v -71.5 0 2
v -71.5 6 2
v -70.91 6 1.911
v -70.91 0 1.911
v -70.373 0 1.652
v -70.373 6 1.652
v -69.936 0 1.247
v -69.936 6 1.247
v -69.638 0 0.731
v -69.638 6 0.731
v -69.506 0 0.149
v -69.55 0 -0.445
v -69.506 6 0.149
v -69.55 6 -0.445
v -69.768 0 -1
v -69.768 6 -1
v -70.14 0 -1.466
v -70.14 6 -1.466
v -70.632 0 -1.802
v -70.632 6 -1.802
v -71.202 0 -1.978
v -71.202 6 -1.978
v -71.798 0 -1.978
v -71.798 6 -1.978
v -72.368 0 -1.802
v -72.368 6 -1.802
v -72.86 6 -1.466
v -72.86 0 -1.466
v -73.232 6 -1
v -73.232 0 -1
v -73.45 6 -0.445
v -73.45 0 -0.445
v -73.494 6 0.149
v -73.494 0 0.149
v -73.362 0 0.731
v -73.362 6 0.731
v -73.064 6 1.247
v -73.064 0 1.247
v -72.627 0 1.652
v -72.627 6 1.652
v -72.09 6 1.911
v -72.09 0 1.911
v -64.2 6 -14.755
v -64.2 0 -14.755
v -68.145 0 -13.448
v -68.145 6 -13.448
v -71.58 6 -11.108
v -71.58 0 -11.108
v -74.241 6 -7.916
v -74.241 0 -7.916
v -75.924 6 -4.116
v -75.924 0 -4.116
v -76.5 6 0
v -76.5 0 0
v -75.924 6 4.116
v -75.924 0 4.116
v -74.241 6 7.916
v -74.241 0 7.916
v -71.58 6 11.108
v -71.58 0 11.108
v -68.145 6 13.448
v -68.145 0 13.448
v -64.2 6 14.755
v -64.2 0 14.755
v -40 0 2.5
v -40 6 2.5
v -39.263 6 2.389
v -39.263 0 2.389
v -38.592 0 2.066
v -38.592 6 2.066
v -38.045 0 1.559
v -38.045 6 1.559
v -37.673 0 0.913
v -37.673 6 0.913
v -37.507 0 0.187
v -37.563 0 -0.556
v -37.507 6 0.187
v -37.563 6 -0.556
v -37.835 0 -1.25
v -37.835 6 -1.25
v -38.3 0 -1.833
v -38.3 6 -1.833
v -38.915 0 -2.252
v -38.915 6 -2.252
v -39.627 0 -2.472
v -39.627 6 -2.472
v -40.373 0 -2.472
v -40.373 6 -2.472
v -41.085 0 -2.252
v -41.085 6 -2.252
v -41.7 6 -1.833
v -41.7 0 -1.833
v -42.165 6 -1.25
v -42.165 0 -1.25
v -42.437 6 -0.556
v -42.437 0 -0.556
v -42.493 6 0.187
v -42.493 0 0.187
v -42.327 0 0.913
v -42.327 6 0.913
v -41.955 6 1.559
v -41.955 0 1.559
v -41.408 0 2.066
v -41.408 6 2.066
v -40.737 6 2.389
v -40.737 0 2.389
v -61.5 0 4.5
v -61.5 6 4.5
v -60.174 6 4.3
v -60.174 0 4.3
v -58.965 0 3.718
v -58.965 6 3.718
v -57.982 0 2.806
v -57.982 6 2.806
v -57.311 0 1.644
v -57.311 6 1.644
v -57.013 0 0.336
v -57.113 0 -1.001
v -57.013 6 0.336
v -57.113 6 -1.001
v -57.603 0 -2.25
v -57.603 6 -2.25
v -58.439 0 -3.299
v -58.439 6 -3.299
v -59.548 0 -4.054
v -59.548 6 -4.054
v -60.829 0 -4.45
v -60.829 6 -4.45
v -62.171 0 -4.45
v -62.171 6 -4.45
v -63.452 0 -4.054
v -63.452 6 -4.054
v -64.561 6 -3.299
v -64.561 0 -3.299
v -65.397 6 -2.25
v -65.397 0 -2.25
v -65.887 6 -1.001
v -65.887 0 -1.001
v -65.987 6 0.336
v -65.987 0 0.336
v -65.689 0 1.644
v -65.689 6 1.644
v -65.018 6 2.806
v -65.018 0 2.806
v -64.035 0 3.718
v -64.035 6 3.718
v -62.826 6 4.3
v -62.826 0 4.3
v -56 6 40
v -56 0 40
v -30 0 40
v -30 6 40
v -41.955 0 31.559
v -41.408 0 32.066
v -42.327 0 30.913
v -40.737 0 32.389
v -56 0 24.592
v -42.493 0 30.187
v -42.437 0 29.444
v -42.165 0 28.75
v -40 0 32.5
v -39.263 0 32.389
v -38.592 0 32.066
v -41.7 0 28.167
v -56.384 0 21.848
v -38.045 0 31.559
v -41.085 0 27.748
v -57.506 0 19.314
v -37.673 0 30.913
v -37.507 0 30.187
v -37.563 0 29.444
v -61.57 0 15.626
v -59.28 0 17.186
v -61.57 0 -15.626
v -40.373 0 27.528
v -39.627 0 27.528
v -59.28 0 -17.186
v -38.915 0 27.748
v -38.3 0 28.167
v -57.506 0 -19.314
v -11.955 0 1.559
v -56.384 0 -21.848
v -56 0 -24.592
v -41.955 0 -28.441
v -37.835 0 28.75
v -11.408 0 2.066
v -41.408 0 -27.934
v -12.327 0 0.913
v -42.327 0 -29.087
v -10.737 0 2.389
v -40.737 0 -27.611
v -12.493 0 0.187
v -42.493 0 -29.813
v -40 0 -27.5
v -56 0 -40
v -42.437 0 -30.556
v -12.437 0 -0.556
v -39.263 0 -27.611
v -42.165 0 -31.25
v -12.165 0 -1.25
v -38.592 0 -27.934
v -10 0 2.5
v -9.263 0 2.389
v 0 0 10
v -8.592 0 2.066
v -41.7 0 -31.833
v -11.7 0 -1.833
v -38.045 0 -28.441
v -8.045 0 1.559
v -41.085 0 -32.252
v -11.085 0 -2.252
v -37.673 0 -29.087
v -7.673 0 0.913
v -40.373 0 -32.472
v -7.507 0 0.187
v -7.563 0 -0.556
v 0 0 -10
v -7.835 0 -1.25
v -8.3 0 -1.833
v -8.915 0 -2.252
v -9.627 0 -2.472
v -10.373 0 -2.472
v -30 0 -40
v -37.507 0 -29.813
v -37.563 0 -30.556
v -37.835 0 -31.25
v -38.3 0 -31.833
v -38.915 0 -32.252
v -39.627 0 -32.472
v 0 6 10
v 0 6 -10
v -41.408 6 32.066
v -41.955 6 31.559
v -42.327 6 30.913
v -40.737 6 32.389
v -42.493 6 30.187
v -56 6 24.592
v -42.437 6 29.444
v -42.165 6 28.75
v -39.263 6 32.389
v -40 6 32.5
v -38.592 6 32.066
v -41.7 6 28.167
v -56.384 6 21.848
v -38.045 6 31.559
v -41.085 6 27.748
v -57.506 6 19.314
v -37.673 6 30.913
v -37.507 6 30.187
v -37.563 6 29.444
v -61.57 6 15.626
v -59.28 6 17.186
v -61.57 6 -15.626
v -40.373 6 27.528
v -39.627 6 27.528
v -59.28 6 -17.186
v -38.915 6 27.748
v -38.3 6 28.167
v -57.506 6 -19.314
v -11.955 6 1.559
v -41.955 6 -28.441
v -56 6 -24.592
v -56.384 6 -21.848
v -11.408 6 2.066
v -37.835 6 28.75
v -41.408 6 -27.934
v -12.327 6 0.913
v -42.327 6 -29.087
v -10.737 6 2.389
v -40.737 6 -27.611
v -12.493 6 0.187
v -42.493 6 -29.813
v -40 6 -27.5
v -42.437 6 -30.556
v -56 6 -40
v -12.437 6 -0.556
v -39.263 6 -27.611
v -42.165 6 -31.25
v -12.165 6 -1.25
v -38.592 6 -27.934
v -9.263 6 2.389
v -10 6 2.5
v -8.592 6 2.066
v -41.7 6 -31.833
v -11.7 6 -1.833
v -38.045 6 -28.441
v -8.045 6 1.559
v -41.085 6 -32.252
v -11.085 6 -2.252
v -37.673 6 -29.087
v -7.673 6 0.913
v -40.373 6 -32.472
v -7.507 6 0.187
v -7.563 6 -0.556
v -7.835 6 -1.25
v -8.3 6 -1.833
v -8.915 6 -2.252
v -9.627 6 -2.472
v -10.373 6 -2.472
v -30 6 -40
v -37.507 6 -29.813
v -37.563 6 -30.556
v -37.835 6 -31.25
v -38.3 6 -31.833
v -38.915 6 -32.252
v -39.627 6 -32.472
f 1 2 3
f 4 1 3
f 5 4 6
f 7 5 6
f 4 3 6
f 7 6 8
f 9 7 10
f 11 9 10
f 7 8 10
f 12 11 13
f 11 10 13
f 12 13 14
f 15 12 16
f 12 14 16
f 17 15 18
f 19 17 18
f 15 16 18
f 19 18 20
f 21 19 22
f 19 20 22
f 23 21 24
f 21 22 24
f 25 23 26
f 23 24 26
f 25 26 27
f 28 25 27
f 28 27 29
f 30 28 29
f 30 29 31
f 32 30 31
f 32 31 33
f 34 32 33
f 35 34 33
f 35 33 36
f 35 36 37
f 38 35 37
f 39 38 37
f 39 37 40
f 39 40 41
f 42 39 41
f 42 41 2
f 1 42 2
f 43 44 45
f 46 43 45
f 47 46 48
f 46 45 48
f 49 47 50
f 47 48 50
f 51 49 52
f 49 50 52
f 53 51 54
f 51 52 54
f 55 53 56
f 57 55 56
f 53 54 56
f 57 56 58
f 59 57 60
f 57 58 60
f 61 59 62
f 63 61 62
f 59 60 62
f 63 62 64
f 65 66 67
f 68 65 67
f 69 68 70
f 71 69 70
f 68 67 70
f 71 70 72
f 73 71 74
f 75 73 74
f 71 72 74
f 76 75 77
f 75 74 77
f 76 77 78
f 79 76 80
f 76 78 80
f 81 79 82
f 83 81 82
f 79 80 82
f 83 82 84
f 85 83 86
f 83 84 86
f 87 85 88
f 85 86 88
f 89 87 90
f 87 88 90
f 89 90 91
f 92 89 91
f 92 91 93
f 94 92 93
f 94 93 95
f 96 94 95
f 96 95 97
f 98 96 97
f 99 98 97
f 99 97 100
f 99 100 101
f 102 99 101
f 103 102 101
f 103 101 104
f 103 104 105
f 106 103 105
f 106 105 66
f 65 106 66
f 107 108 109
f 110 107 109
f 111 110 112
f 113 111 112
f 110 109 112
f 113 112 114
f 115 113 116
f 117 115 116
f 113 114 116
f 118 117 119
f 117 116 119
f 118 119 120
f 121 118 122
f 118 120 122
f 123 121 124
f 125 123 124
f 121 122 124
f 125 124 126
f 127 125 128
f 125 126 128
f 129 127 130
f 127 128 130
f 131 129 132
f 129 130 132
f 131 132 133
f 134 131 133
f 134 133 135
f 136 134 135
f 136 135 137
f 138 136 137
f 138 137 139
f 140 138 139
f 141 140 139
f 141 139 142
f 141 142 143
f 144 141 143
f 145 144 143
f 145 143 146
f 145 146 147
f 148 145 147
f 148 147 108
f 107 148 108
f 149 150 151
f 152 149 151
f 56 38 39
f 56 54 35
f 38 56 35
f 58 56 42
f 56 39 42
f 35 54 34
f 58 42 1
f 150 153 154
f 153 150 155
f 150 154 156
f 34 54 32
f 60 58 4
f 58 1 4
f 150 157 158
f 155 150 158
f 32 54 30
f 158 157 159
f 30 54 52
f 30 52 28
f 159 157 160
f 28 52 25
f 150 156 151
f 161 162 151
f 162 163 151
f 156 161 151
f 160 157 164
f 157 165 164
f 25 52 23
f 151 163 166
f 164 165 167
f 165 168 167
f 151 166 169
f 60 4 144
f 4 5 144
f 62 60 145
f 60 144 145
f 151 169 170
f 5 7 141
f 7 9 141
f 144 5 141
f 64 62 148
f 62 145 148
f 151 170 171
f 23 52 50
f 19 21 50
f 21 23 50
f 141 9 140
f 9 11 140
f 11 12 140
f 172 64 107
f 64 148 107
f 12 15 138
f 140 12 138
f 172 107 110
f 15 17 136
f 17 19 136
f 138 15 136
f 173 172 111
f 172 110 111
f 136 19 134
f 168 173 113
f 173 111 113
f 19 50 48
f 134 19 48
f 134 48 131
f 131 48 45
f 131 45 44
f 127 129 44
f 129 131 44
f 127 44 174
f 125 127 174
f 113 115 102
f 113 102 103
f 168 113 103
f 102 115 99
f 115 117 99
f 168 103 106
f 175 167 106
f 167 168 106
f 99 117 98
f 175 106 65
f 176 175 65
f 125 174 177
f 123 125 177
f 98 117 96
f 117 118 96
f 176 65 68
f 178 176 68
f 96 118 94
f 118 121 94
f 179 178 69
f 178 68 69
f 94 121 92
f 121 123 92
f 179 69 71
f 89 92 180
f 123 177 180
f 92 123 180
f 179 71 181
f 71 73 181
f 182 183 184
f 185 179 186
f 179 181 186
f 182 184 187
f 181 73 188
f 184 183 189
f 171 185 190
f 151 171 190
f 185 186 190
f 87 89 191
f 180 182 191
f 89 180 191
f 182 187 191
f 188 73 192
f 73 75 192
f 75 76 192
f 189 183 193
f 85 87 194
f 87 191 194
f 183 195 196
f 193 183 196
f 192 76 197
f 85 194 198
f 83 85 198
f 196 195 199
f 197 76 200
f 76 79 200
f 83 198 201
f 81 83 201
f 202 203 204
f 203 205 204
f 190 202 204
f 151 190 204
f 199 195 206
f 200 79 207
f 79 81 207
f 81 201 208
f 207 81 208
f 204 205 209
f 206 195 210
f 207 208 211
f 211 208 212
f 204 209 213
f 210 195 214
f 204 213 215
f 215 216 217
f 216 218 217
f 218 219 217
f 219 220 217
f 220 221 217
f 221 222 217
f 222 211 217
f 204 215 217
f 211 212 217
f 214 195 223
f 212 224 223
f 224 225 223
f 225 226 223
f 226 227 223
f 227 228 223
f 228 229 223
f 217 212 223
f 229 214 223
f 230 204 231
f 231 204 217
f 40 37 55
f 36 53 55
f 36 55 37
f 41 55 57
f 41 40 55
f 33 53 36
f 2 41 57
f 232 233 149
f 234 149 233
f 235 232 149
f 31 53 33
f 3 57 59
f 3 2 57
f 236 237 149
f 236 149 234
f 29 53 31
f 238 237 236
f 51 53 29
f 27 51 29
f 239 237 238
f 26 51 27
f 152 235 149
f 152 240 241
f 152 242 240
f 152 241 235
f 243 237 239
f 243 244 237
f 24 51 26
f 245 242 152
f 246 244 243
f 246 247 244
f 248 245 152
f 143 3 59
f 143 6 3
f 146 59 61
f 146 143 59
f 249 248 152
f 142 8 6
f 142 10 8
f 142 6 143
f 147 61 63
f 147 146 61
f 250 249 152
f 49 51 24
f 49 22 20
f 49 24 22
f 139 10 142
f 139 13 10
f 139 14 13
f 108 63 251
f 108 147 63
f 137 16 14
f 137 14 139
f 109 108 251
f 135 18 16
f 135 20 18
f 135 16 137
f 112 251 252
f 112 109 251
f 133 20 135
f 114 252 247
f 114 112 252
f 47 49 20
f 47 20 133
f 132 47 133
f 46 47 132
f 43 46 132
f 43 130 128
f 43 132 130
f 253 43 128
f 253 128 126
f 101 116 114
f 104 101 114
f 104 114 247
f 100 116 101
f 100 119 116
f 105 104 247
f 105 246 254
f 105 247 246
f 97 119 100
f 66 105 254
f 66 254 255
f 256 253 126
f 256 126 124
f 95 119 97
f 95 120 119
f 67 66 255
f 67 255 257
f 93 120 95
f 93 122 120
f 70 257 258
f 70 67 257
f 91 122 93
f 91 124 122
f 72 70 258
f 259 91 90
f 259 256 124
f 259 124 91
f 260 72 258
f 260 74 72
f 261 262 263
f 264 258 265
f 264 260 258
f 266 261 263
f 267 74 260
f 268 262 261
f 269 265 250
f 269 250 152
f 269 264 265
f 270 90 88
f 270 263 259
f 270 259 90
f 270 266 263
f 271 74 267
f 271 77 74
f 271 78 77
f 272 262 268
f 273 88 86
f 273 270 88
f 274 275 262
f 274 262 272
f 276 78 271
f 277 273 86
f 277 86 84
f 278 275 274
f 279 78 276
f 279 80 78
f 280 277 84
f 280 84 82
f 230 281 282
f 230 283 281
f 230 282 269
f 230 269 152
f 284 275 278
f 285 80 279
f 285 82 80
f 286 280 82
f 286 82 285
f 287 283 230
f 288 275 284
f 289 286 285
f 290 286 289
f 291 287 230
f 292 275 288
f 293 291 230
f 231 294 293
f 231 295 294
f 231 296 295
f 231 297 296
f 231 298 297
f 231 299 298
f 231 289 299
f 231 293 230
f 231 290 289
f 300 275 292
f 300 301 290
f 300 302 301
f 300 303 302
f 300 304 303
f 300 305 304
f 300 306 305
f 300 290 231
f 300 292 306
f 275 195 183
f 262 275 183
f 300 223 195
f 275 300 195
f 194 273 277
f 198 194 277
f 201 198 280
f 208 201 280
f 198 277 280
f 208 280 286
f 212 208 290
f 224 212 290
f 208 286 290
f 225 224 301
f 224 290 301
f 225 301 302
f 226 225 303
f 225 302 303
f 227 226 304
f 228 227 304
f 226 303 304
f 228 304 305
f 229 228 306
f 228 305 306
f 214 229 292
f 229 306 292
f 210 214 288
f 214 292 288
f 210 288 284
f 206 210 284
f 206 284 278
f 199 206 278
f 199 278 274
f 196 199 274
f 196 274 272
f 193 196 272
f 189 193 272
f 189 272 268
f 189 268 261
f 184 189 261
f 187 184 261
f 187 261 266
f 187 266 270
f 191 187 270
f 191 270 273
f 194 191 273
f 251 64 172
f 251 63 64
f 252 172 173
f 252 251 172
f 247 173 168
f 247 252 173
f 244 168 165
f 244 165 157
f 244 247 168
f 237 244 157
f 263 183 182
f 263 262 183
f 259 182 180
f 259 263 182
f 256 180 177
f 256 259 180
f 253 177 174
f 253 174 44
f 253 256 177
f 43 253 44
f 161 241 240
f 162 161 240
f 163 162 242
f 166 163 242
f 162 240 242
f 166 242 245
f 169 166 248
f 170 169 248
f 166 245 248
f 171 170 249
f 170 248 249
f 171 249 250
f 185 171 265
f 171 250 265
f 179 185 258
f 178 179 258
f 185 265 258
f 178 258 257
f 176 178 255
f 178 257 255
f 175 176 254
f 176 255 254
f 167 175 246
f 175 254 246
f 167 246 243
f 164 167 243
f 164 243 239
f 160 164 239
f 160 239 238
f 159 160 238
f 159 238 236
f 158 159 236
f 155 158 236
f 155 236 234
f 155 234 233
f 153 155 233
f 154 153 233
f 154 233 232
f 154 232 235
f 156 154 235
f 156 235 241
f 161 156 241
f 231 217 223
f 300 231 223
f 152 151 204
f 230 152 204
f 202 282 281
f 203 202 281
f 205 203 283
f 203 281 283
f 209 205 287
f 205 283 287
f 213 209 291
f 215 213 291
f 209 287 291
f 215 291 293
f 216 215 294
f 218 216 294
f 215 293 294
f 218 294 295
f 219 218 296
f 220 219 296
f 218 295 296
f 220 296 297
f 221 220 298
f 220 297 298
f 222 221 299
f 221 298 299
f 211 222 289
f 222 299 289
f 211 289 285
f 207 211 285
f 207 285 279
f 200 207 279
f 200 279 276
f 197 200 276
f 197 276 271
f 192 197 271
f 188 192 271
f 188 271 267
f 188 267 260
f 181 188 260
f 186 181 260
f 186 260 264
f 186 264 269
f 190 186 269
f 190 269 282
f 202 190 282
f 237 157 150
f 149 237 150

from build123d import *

# Parameters (mm, degrees)
BOSS_EXTRUDE1_DEPTH = 6
FILLET1_R           = 10
SKETCH3_R           = 2.5
SKETCH3_R_2         = 4.5
SKETCH3_R_3         = 2
CUT_EXTRUDE1_DEPTH  = 87.534675131


with BuildPart() as part:
    # Sketch1 → Boss-Extrude1 (new body)
    with BuildSketch(Plane(origin=(0, 0, 0), x_dir=(1, 0, 0), z_dir=(0, 1, 0))):
        with BuildLine():
            Line((0, 0), (0, 10))
            Line((0, 10), (-30, 40))
            Line((-30, 40), (-56, 40))
            Line((-56, 40), (-56, 13.955285737))
            ThreePointArc((-56, 13.955285737), (-76.5, 0), (-56, -13.955285737))
            Line((-56, -13.955285737), (-56, -40))
            Line((-56, -40), (-30, -40))
            Line((-30, -40), (0, -10))
            Line((0, -10), (0, 0))
        make_face()
    extrude(amount=BOSS_EXTRUDE1_DEPTH)

    # Fillet1
    fillet1_edges = [part.edges().sort_by_distance(p)[0] for p in [
        (-56, 3, 13.955285737),
        (-56, 3, -13.955285737),
    ]]
    fillet(fillet1_edges, radius=FILLET1_R)

    # Sketch3 → Cut-Extrude1 (cut, through all)
    with BuildSketch(Plane(origin=(0, 6, 0), x_dir=(1, 0, 0), z_dir=(0, 1, 0))):
        with Locations(Location((-40, 0, 0), (0, 0, 270))):
            Circle(SKETCH3_R)
        with Locations(Location((-40, -30, 0), (0, 0, 270))):
            Circle(SKETCH3_R)
        with Locations(Location((-10, 0, 0), (0, 0, 270))):
            Circle(SKETCH3_R)
        with Locations(Location((-40, 30, 0), (0, 0, 270))):
            Circle(SKETCH3_R)
        with Locations(Location((-61.5, 0, 0), (0, 0, 270))):
            Circle(SKETCH3_R_2)
        with Locations(Location((-71.5, 0, 0), (0, 0, 270))):
            Circle(SKETCH3_R_3)
    extrude(amount=-CUT_EXTRUDE1_DEPTH, mode=Mode.SUBTRACT)


solid = part.part
